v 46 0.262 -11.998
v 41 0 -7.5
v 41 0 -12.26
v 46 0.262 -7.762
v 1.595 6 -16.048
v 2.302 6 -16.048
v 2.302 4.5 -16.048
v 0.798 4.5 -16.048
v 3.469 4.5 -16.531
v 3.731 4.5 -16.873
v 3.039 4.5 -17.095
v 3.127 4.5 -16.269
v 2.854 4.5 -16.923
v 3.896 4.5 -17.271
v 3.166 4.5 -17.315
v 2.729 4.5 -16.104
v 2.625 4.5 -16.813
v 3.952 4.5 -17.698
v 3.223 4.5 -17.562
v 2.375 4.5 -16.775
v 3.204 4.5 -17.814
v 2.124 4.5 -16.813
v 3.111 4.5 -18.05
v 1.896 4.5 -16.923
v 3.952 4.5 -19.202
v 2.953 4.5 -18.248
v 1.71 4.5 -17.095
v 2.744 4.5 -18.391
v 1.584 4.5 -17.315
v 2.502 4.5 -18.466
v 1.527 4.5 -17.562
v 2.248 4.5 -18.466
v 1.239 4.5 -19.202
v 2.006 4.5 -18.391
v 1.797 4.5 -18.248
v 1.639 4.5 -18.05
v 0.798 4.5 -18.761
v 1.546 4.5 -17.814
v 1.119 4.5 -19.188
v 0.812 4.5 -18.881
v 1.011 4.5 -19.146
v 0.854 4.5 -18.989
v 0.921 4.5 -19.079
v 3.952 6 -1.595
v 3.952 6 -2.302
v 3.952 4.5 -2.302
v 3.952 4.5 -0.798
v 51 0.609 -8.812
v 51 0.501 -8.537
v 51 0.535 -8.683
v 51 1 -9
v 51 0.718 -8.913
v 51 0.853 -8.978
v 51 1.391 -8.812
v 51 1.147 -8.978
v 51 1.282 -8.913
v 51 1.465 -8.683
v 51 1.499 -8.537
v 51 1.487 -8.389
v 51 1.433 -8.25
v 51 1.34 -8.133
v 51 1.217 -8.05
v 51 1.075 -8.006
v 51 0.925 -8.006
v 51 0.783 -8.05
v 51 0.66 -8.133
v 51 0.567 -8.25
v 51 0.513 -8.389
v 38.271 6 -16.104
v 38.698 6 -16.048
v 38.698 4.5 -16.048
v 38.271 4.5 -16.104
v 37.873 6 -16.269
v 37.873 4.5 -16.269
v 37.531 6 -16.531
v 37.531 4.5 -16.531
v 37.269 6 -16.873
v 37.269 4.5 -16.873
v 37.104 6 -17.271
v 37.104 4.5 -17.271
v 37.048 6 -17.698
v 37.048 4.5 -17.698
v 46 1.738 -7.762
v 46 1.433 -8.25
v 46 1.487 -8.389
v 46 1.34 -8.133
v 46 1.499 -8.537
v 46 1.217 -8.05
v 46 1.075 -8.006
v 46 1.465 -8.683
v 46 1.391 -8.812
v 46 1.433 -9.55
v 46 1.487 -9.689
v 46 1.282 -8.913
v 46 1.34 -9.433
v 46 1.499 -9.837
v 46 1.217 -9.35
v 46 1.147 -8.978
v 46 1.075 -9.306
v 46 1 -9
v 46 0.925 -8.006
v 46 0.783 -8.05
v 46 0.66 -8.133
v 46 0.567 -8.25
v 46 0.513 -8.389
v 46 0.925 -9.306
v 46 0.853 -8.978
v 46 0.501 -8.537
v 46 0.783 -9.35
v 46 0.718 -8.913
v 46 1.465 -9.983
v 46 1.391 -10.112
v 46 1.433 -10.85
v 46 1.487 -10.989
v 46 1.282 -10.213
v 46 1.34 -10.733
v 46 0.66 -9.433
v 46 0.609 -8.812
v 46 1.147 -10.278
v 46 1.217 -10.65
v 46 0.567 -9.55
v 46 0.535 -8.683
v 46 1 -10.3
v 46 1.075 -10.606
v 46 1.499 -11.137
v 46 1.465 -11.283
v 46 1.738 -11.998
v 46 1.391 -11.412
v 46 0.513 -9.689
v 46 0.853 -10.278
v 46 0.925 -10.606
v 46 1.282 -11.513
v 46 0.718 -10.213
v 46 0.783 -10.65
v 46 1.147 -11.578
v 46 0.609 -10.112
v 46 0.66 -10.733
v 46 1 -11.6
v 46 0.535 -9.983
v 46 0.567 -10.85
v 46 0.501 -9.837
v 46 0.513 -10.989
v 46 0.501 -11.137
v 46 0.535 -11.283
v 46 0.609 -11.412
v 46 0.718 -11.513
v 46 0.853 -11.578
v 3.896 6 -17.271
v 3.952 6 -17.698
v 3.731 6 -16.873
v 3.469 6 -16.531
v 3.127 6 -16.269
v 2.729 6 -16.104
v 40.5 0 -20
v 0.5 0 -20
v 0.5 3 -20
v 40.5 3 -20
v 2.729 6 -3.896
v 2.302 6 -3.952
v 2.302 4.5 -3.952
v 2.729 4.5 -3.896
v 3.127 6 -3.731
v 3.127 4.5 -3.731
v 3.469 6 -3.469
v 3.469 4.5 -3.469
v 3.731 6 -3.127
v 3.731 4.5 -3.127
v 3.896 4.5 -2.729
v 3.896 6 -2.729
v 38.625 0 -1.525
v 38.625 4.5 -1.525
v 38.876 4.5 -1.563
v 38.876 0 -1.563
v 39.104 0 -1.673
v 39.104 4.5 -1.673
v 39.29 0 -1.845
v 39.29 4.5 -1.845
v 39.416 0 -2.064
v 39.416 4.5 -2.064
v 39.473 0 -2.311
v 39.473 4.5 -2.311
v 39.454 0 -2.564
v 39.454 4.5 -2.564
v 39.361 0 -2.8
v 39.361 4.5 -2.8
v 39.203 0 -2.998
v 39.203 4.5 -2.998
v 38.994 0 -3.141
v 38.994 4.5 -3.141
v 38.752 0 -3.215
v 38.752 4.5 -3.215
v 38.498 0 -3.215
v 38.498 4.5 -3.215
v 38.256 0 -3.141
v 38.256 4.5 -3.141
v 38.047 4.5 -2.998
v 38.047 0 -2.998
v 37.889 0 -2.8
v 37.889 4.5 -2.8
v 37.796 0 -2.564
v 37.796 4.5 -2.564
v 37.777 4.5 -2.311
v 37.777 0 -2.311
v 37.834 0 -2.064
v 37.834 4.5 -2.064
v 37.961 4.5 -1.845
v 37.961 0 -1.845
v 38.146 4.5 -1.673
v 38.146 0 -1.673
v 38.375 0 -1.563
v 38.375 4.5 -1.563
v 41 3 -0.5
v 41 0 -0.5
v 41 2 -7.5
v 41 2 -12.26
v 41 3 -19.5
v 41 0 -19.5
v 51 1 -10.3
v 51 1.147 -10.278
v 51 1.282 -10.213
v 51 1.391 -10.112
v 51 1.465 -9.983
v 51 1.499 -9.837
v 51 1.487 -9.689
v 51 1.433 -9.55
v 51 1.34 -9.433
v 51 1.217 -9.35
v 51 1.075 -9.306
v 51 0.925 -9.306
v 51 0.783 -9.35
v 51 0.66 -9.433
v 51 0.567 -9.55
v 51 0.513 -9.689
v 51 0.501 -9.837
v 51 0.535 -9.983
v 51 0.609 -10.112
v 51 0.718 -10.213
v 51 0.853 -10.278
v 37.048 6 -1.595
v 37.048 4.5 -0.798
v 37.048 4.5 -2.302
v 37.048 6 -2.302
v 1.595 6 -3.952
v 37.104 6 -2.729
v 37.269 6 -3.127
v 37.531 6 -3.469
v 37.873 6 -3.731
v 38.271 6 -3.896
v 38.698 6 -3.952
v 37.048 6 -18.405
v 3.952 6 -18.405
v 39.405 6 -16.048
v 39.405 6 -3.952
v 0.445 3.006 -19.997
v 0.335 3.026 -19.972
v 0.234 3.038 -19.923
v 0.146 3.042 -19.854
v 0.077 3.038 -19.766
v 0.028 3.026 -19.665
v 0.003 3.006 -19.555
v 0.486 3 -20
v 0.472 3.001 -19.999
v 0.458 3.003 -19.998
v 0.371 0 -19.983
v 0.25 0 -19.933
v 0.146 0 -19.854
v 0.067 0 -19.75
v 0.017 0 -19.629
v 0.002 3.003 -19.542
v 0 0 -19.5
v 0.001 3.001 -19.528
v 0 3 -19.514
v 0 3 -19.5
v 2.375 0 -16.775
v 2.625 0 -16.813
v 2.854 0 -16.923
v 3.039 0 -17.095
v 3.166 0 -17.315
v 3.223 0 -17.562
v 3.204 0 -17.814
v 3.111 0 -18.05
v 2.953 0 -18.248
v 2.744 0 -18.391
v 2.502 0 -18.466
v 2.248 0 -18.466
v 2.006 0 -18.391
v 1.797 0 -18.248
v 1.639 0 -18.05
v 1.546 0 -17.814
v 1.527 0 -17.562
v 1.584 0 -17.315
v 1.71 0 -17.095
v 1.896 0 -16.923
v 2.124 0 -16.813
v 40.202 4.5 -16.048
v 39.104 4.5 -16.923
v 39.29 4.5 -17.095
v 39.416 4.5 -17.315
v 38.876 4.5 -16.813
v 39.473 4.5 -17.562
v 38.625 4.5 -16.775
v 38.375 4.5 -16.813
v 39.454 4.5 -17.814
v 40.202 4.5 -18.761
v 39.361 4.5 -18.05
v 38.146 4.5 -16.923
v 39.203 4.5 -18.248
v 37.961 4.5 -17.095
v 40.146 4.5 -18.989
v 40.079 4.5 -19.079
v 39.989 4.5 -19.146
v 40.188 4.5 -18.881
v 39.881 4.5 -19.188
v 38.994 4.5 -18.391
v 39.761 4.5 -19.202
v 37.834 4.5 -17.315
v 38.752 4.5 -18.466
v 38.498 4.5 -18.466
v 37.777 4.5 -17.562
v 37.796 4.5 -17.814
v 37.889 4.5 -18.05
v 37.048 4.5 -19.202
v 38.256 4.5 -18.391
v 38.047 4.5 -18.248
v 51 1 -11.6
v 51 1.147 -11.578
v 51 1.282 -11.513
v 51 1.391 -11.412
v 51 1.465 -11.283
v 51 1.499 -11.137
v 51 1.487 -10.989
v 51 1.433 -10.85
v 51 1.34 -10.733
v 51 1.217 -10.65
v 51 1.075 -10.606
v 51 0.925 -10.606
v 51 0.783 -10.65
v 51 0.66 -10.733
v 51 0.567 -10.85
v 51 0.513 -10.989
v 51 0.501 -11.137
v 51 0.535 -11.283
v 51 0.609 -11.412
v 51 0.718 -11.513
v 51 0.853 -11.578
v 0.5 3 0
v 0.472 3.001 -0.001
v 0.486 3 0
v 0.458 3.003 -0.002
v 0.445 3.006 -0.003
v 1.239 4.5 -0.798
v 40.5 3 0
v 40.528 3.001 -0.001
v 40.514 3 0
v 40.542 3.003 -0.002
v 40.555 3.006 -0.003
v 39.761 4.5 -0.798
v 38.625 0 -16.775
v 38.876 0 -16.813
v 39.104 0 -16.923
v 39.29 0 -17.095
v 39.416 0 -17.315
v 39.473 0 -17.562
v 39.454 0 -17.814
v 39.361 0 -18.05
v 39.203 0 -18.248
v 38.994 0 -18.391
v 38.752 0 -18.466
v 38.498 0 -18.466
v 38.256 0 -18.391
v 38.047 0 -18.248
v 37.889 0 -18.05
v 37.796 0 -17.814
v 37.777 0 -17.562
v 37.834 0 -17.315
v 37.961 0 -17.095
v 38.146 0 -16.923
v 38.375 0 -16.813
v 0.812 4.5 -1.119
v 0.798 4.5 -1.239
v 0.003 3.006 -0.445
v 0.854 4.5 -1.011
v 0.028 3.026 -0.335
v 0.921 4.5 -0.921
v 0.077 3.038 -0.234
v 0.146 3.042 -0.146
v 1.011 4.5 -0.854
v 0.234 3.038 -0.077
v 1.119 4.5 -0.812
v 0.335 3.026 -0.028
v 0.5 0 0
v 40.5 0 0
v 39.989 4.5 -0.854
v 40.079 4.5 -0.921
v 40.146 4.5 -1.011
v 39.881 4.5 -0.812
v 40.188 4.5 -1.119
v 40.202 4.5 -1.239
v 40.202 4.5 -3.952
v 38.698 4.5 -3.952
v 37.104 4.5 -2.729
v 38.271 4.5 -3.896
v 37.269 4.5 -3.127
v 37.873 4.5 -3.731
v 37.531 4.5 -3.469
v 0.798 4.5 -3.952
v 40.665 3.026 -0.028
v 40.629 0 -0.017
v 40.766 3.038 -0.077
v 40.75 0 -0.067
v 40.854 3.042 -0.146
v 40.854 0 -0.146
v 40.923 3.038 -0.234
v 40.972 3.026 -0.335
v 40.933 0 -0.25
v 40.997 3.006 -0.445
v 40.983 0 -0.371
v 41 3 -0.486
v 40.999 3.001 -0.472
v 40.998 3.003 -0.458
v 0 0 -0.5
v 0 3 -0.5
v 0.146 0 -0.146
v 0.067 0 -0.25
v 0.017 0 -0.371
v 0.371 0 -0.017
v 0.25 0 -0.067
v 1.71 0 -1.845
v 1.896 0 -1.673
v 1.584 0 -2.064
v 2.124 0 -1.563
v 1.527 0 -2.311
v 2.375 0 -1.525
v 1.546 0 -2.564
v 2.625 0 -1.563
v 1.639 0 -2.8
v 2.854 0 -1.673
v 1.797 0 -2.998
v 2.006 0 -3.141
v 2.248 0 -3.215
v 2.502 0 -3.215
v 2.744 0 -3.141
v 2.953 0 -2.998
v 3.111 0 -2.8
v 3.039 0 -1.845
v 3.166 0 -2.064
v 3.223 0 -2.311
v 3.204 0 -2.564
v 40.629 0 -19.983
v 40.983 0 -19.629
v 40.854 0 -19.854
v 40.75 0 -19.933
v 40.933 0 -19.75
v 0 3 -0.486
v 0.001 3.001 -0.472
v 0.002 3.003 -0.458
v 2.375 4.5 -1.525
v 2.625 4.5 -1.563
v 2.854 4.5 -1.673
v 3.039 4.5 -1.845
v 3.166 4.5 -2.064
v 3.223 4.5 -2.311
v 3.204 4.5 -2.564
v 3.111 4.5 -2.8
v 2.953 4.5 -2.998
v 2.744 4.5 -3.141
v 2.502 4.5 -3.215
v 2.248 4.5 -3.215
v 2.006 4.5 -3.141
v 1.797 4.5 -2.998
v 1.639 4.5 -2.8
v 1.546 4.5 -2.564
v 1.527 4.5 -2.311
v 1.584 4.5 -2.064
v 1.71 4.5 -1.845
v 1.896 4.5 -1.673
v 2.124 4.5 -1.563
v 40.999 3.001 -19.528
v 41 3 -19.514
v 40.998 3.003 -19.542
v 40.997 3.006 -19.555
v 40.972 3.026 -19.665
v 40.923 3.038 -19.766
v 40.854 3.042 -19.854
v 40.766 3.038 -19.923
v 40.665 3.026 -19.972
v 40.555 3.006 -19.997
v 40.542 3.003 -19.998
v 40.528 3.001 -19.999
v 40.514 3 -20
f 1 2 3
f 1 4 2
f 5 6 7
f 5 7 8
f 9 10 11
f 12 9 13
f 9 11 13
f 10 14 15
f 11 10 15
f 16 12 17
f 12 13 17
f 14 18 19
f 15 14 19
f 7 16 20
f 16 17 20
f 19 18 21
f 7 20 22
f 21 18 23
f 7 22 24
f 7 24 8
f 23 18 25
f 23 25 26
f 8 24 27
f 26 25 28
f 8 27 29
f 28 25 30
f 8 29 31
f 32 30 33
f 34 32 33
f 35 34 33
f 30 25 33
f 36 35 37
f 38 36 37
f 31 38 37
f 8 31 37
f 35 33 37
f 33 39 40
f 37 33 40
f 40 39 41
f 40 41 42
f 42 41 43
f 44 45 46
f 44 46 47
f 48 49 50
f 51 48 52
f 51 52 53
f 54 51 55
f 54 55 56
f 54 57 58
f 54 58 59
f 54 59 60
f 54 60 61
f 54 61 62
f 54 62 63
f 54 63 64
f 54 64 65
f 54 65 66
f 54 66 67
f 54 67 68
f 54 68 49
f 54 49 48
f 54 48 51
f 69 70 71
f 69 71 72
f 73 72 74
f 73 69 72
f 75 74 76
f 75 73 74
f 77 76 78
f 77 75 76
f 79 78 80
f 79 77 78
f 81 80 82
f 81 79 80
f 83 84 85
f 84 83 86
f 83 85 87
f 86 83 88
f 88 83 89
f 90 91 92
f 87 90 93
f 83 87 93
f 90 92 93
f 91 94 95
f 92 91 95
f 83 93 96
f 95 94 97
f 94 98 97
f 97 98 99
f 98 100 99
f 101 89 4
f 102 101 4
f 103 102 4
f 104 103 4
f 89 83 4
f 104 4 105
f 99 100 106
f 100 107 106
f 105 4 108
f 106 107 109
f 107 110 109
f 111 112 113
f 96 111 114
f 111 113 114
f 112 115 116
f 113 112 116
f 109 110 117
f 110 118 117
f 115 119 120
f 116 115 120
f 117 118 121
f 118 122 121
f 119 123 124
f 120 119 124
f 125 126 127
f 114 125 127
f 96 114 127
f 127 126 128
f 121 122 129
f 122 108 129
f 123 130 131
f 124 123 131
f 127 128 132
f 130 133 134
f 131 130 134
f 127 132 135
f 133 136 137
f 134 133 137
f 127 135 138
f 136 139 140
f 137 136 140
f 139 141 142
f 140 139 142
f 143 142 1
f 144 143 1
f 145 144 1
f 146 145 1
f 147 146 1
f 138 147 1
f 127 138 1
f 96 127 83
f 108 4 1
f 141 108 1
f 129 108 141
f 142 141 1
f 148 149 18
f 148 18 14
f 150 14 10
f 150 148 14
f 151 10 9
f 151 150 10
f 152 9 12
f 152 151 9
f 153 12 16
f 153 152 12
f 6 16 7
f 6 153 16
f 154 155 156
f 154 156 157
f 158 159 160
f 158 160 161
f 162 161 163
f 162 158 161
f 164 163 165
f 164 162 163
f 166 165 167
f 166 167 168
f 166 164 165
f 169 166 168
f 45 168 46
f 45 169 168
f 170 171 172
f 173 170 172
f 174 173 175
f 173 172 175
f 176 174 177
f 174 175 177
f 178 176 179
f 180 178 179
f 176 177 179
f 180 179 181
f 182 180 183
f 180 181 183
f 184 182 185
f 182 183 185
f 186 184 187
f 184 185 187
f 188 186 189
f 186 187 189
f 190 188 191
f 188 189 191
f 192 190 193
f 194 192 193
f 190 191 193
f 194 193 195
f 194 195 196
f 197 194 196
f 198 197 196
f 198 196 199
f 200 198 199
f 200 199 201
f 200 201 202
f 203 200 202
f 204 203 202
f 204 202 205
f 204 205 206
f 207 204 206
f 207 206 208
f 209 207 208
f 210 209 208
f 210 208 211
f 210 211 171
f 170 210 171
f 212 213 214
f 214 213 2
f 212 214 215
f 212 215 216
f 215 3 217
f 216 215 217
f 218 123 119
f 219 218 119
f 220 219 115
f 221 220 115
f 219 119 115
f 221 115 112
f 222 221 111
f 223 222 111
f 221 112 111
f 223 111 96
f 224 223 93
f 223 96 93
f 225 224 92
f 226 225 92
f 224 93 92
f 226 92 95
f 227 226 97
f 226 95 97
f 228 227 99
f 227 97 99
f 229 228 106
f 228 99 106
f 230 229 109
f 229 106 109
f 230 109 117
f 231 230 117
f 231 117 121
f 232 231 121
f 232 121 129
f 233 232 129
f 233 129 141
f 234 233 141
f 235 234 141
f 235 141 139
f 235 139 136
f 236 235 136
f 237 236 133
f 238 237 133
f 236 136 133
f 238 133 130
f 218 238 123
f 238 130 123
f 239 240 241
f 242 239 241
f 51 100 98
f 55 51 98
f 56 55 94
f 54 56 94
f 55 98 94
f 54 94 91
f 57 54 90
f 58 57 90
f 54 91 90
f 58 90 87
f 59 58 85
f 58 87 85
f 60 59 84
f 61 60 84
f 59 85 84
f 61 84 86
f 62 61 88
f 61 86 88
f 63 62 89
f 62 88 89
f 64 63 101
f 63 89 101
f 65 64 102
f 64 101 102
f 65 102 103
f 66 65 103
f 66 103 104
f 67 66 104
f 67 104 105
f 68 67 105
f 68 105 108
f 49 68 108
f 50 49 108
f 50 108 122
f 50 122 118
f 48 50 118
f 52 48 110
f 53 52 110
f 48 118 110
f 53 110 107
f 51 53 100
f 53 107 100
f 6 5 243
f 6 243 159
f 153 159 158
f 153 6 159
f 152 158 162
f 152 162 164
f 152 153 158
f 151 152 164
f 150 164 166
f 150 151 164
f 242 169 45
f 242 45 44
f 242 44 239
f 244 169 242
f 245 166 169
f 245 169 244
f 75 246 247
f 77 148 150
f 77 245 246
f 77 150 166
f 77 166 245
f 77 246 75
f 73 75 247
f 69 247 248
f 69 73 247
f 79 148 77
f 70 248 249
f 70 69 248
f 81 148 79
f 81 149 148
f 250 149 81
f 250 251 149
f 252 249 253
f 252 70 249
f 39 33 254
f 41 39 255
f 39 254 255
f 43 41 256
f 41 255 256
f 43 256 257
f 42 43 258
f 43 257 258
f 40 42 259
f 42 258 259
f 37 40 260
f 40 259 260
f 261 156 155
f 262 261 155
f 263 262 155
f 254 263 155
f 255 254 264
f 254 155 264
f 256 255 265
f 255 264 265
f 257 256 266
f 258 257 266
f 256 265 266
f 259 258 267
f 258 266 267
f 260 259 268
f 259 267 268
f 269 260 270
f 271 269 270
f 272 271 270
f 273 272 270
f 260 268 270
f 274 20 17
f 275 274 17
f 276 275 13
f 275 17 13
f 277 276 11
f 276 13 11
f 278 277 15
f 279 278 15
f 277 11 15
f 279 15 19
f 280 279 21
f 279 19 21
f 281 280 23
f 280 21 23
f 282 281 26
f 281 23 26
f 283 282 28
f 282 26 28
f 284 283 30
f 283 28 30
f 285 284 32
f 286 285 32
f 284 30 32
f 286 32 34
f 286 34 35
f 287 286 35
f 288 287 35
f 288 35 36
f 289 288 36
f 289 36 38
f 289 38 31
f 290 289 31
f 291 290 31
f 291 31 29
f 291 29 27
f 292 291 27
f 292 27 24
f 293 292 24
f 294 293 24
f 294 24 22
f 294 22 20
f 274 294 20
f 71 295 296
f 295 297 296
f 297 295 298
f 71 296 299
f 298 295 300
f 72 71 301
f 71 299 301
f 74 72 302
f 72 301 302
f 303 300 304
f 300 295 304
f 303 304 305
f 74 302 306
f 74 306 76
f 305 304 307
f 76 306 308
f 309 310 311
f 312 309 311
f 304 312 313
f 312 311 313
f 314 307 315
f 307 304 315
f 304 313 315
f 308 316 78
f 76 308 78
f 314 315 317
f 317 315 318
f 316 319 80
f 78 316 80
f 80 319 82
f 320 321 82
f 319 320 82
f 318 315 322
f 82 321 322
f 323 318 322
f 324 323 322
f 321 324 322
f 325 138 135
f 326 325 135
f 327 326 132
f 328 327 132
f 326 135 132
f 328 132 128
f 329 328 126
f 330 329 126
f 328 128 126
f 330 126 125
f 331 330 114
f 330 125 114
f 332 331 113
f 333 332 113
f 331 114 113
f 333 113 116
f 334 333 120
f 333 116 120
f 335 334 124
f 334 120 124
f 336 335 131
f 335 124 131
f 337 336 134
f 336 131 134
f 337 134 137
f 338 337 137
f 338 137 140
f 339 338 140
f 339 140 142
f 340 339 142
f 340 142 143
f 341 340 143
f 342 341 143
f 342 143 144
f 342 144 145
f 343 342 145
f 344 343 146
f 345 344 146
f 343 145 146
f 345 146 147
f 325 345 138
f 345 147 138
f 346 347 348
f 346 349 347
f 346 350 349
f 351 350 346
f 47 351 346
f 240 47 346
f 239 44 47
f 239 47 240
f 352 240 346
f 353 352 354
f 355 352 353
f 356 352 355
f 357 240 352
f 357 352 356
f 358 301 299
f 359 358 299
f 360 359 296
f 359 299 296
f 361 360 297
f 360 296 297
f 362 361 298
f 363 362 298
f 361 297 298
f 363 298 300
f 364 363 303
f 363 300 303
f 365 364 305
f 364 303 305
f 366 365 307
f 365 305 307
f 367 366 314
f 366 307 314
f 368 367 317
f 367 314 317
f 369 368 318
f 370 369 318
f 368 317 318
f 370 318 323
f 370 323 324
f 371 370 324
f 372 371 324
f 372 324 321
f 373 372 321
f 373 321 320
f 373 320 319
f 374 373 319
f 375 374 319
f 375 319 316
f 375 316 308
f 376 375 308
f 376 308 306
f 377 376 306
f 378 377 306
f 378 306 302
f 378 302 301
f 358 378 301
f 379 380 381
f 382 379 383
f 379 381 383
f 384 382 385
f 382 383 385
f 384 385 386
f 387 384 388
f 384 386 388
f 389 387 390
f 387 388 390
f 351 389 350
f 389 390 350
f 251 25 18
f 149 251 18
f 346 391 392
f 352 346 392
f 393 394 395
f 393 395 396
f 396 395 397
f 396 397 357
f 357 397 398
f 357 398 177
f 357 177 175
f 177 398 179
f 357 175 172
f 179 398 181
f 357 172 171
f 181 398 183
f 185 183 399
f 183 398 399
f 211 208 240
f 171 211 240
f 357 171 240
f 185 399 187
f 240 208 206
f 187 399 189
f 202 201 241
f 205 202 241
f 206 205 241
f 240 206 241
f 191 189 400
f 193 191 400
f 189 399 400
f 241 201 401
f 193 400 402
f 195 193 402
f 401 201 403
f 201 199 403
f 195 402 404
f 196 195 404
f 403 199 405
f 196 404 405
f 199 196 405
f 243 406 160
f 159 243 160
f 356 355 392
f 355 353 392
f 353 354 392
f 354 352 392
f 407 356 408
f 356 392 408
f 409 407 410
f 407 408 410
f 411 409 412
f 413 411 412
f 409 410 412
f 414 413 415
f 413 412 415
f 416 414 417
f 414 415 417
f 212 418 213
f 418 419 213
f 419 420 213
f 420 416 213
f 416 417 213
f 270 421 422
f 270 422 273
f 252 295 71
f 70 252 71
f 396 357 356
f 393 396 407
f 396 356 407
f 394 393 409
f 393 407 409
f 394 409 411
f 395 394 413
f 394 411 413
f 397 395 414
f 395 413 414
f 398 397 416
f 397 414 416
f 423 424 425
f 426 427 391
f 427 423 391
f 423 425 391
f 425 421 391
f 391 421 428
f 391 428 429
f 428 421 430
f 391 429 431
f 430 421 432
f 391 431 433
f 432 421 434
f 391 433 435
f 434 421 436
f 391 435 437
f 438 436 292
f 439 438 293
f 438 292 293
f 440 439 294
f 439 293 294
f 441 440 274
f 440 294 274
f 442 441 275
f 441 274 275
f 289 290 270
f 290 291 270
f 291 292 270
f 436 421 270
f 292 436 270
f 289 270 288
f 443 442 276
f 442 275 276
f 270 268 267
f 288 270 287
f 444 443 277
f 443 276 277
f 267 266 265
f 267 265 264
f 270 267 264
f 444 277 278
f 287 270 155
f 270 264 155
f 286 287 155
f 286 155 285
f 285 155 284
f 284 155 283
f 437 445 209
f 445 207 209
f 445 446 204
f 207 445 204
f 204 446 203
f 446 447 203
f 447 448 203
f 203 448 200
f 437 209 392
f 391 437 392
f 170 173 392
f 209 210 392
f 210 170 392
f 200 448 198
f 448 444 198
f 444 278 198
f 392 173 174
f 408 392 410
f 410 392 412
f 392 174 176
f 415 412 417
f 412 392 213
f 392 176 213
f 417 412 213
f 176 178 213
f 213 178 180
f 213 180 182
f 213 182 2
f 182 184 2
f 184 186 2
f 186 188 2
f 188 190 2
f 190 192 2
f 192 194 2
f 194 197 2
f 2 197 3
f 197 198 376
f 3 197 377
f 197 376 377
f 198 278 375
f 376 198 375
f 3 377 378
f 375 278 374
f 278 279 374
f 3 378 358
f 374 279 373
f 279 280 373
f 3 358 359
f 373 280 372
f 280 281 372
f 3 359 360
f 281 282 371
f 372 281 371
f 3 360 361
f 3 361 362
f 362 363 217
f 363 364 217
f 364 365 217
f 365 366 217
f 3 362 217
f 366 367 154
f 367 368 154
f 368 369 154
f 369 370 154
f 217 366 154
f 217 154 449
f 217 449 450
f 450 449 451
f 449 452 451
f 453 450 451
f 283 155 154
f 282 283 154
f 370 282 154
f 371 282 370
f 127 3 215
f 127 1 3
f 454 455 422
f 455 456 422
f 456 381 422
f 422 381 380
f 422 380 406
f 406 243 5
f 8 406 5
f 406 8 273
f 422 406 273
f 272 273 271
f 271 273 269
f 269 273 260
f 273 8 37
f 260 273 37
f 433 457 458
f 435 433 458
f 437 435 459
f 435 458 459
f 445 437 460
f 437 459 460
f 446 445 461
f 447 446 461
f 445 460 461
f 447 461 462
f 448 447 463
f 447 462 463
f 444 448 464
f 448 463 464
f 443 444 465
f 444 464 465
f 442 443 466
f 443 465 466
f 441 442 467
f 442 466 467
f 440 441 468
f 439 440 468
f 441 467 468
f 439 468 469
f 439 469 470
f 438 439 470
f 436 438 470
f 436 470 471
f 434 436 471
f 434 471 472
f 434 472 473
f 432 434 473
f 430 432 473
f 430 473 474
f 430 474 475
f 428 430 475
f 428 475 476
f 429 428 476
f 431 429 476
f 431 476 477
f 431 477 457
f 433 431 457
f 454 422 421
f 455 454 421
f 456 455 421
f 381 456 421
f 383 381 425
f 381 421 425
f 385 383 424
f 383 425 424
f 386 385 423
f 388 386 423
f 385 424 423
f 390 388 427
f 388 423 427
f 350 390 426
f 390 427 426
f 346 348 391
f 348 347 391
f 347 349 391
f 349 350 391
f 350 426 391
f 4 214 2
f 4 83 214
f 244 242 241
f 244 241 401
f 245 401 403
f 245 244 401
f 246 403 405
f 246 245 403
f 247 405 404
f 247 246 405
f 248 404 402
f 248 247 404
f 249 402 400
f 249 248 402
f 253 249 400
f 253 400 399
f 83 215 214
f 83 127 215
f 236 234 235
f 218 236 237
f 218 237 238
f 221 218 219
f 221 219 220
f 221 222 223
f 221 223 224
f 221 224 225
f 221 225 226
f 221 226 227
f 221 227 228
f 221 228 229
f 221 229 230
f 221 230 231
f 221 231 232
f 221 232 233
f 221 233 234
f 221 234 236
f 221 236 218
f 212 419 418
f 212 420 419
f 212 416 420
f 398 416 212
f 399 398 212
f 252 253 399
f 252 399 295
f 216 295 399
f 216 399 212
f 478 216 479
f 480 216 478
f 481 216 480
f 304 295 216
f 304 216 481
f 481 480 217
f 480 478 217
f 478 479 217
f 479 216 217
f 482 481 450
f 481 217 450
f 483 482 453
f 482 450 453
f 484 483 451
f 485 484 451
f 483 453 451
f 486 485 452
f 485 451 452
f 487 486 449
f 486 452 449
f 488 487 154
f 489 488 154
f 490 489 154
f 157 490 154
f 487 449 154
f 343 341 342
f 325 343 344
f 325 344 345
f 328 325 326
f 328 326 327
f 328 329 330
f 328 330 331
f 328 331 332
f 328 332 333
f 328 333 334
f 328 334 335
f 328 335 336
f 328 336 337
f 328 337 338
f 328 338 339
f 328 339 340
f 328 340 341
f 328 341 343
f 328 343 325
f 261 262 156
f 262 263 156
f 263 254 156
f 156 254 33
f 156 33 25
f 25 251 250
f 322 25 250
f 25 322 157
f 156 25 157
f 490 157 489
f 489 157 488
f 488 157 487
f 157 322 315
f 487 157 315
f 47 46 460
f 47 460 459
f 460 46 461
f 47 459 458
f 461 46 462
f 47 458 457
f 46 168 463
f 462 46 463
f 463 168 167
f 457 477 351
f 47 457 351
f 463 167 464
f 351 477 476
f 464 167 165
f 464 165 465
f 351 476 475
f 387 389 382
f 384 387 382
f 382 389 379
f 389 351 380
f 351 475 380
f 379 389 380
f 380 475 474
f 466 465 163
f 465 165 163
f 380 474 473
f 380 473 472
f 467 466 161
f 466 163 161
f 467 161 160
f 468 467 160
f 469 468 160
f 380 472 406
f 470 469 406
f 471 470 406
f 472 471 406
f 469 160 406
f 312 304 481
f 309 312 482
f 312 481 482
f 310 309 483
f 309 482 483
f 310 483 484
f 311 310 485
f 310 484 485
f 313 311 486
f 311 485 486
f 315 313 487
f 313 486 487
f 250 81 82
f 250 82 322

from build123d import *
from OCP.BRepFilletAPI import BRepFilletAPI_MakeChamfer

# Parameters (mm, degrees)
SKETCH1_W           = 41
SKETCH1_H           = 20
BOSS_EXTRUDE1_DEPTH = 6
CHAMFER1_SIZE       = 3
CHAMFER1_SIZE2      = 1.595128295
BOSS_EXTRUDE2_DEPTH = 5
BOSS_EXTRUDE2_TAPER = 3
SKETCH3_R           = 0.5
BOSS_EXTRUDE3_DEPTH = 5
CUT_EXTRUDE3_DEPTH  = 1.5
SKETCH5_R           = 0.85
CUT_EXTRUDE4_DEPTH  = 55.965898527
FILLET1_R           = 0.5


with BuildPart() as part:
    # Sketch1 → Boss-Extrude1 (new body)
    with BuildSketch(Plane(origin=(0, 0, 0), x_dir=(1, 0, 0), z_dir=(0, 1, 0))):
        with Locations((20.5, 10)):
            Rectangle(SKETCH1_W, SKETCH1_H)
    extrude(amount=BOSS_EXTRUDE1_DEPTH)

    # Chamfer1: one chamfer whose edges measure the first distance from different faces: ONE call of the kernel's chamfer builder (chamfer() names one face for all edges)
    chamfer1_edges_1 = [part.edges().sort_by_distance(p)[0] for p in [
        (41, 6, -10),
    ]]
    chamfer1_side_1 = [part.faces().sort_by_distance(p)[0] for p in [
        (41, 3, -10),
    ]]
    chamfer1_edges_2 = [part.edges().sort_by_distance(p)[0] for p in [
        (20.5, 6, -20),
    ]]
    chamfer1_side_2 = [part.faces().sort_by_distance(p)[0] for p in [
        (20.5, 3, -20),
    ]]
    chamfer1_edges_3 = [part.edges().sort_by_distance(p)[0] for p in [
        (0, 6, -10),
    ]]
    chamfer1_side_3 = [part.faces().sort_by_distance(p)[0] for p in [
        (0, 3, -10),
    ]]
    chamfer1_edges_4 = [part.edges().sort_by_distance(p)[0] for p in [
        (20.5, 6, 0),
    ]]
    chamfer1_side_4 = [part.faces().sort_by_distance(p)[0] for p in [
        (20.5, 3, 0),
    ]]
    chamfer1 = BRepFilletAPI_MakeChamfer(part.part.solid().wrapped)
    for e in chamfer1_edges_1:
        chamfer1.Add(CHAMFER1_SIZE, CHAMFER1_SIZE2, e.wrapped, chamfer1_side_1[0].wrapped)  # the first distance lies on this face
    for e in chamfer1_edges_2:
        chamfer1.Add(CHAMFER1_SIZE, CHAMFER1_SIZE2, e.wrapped, chamfer1_side_2[0].wrapped)  # the first distance lies on this face
    for e in chamfer1_edges_3:
        chamfer1.Add(CHAMFER1_SIZE, CHAMFER1_SIZE2, e.wrapped, chamfer1_side_3[0].wrapped)  # the first distance lies on this face
    for e in chamfer1_edges_4:
        chamfer1.Add(CHAMFER1_SIZE, CHAMFER1_SIZE2, e.wrapped, chamfer1_side_4[0].wrapped)  # the first distance lies on this face
    add(Compound.cast(chamfer1.Shape()), mode=Mode.REPLACE)

    # Sketch2 → Boss-Extrude2 (add)
    with BuildSketch(Plane(origin=(41, 0, 0), x_dir=(0, 0, -1), z_dir=(1, 0, 0))):
        Polygon((10, 2), (7.5, 2), (7.5, 0), (12.260148274, 0), (12.260148274, 2), align=None)
    extrude(amount=BOSS_EXTRUDE2_DEPTH, taper=BOSS_EXTRUDE2_TAPER)

    # Sketch3 → Boss-Extrude3 (add)
    with BuildSketch(Plane(origin=(46, 0, 0), x_dir=(0, 0, -1), z_dir=(1, 0, 0))):
        with Locations((8.5, 1)):
            Circle(SKETCH3_R)
        with Locations((9.8, 1)):
            Circle(SKETCH3_R)
        with Locations((11.1, 1)):
            Circle(SKETCH3_R)
    extrude(amount=BOSS_EXTRUDE3_DEPTH)

    # Sketch4 → Cut-Extrude3 (cut)
    with BuildSketch(Plane(origin=(0, 6, 0), x_dir=(1, 0, 0), z_dir=(0, 1, 0))):
        with BuildLine():
            Line((38.697764924, 0.652235076), (37.047764924, 0.652235076))
            Line((37.047764924, 0.652235076), (37.047764924, 2.302235076))
            ThreePointArc((37.047764924, 2.302235076), (37.531038735, 3.468961265), (38.697764924, 3.952235076))
            Line((38.697764924, 3.952235076), (40.347764924, 3.952235076))
            Line((40.347764924, 3.952235076), (40.347764924, 2.302235076))
            Line((40.347764924, 2.302235076), (40.347764924, 0.652235076))
            Line((40.347764924, 0.652235076), (38.697764924, 0.652235076))
        make_face()
        with BuildLine():
            Line((37.047764924, 17.697764924), (37.047764924, 19.347764924))
            Line((37.047764924, 19.347764924), (38.697764924, 19.347764924))
            Line((38.697764924, 19.347764924), (40.347764924, 19.347764924))
            Line((40.347764924, 19.347764924), (40.347764924, 17.697764924))
            Line((40.347764924, 17.697764924), (40.347764924, 16.047764924))
            Line((40.347764924, 16.047764924), (38.697764924, 16.047764924))
            ThreePointArc((38.697764924, 16.047764924), (37.531038735, 16.531038735), (37.047764924, 17.697764924))
        make_face()
        with BuildLine():
            Line((2.302235076, 16.047764924), (0.652235076, 16.047764924))
            Line((0.652235076, 16.047764924), (0.652235076, 17.697764924))
            Line((0.652235076, 17.697764924), (0.652235076, 19.347764924))
            Line((0.652235076, 19.347764924), (2.302235076, 19.347764924))
            Line((2.302235076, 19.347764924), (3.952235076, 19.347764924))
            Line((3.952235076, 19.347764924), (3.952235076, 17.697764924))
            ThreePointArc((3.952235076, 17.697764924), (3.468961265, 16.531038735), (2.302235076, 16.047764924))
        make_face()
        with BuildLine():
            Line((3.952235076, 2.302235076), (3.952235076, 0.652235076))
            Line((3.952235076, 0.652235076), (2.302235076, 0.652235076))
            Line((2.302235076, 0.652235076), (0.652235076, 0.652235076))
            Line((0.652235076, 0.652235076), (0.652235076, 2.302235076))
            Line((0.652235076, 2.302235076), (0.652235076, 3.952235076))
            Line((0.652235076, 3.952235076), (2.302235076, 3.952235076))
            ThreePointArc((2.302235076, 3.952235076), (3.468961265, 3.468961265), (3.952235076, 2.302235076))
        make_face()
    extrude(amount=-CUT_EXTRUDE3_DEPTH, mode=Mode.SUBTRACT)

    # Sketch5 → Cut-Extrude4 (cut, through all)
    with BuildSketch(Plane(origin=(0, 4.5, 0), x_dir=(1, 0, 0), z_dir=(0, 1, 0))):
        with Locations(Location((38.625100388, 2.374899612, 0), (0, 0, 270))):
            Circle(SKETCH5_R)
        with Locations(Location((38.625100388, 17.625100388, 0), (0, 0, 270))):
            Circle(SKETCH5_R)
        with Locations(Location((2.374899612, 17.625100388, 0), (0, 0, 270))):
            Circle(SKETCH5_R)
        with Locations(Location((2.374899612, 2.374899612, 0), (0, 0, 270))):
            Circle(SKETCH5_R)
    extrude(amount=-CUT_EXTRUDE4_DEPTH, mode=Mode.SUBTRACT)

    # Fillet1
    # the kernel refuses this fillet: 0.5 mm, written as the material it takes off along each edge
    with BuildSketch(Plane(origin=(-0.424571433, 2.20149727, -20.424571433), x_dir=(-0.19951100260176627, -0.3752256227209219, 0.9052077617290598), z_dir=(0.42496930254486104, 0.79925101425589, 0.42496930254486104)), Plane(origin=(-0.424571433, 2.20149727, 0.424571433), x_dir=(0.9052077617290598, -0.3752256227209218, 0.19951100260176646), z_dir=(0.42496930254486104, 0.79925101425589, -0.42496930254486104))) as fillet1_piece_1:
        with BuildLine():
            CenterArc((FILLET1_R * 0.799251014256, FILLET1_R), FILLET1_R, 192.732736423, 77.267263577)
            Line((-FILLET1_R * 0.176157759496, FILLET1_R * 0.779596451735), (0, 0))
            Line((0, 0), (FILLET1_R * 0.799251014256, 0))
        make_face()
    extrude(amount=3.874884616, mode=Mode.SUBTRACT)
    with BuildSketch(Plane(origin=(0, -1.25, -20), x_dir=(0, 0, 1), z_dir=(0, 1, 0)), Plane(origin=(0, -1.25, 0), x_dir=(1, 0, 0), z_dir=(0, 1, 0))) as fillet1_piece_2:
        with BuildLine():
            CenterArc((FILLET1_R, FILLET1_R), FILLET1_R, 180, 90)
            Line((0, FILLET1_R), (0, 0))
            Line((0, 0), (FILLET1_R, 0))
        make_face()
    extrude(amount=5.5, mode=Mode.SUBTRACT)
    with BuildSketch(Plane(origin=(41.424571433, 2.20149727, 0.424571433), x_dir=(-0.9052077617290598, -0.37522562272092175, 0.1995110026017665), z_dir=(-0.42496930254486104, 0.79925101425589, -0.42496930254486104)), Plane(origin=(41.424571433, 2.20149727, -20.424571433), x_dir=(0.1995110026017654, -0.37522562272092236, 0.9052077617290599), z_dir=(-0.42496930254486104, 0.79925101425589, 0.42496930254486104))) as fillet1_piece_3:
        with BuildLine():
            CenterArc((FILLET1_R * 0.799251014256, -FILLET1_R), FILLET1_R, 90, 77.267263577)
            Line((-FILLET1_R * 0.176157759496, -FILLET1_R * 0.779596451735), (0, 0))
            Line((0, 0), (FILLET1_R * 0.799251014256, 0))
        make_face()
    extrude(amount=3.874884616, mode=Mode.SUBTRACT)
    with BuildSketch(Plane(origin=(41, -1.25, -20), x_dir=(0, 0, 1), z_dir=(0, 1, 0)), Plane(origin=(41, -1.25, 0), x_dir=(-1, 0, 0), z_dir=(0, 1, 0))) as fillet1_piece_4:
        with BuildLine():
            CenterArc((FILLET1_R, -FILLET1_R), FILLET1_R, 90, 90)
            Line((0, -FILLET1_R), (0, 0))
            Line((0, 0), (FILLET1_R, 0))
        make_face()
    extrude(amount=5.5, mode=Mode.SUBTRACT)


solid = part.part
